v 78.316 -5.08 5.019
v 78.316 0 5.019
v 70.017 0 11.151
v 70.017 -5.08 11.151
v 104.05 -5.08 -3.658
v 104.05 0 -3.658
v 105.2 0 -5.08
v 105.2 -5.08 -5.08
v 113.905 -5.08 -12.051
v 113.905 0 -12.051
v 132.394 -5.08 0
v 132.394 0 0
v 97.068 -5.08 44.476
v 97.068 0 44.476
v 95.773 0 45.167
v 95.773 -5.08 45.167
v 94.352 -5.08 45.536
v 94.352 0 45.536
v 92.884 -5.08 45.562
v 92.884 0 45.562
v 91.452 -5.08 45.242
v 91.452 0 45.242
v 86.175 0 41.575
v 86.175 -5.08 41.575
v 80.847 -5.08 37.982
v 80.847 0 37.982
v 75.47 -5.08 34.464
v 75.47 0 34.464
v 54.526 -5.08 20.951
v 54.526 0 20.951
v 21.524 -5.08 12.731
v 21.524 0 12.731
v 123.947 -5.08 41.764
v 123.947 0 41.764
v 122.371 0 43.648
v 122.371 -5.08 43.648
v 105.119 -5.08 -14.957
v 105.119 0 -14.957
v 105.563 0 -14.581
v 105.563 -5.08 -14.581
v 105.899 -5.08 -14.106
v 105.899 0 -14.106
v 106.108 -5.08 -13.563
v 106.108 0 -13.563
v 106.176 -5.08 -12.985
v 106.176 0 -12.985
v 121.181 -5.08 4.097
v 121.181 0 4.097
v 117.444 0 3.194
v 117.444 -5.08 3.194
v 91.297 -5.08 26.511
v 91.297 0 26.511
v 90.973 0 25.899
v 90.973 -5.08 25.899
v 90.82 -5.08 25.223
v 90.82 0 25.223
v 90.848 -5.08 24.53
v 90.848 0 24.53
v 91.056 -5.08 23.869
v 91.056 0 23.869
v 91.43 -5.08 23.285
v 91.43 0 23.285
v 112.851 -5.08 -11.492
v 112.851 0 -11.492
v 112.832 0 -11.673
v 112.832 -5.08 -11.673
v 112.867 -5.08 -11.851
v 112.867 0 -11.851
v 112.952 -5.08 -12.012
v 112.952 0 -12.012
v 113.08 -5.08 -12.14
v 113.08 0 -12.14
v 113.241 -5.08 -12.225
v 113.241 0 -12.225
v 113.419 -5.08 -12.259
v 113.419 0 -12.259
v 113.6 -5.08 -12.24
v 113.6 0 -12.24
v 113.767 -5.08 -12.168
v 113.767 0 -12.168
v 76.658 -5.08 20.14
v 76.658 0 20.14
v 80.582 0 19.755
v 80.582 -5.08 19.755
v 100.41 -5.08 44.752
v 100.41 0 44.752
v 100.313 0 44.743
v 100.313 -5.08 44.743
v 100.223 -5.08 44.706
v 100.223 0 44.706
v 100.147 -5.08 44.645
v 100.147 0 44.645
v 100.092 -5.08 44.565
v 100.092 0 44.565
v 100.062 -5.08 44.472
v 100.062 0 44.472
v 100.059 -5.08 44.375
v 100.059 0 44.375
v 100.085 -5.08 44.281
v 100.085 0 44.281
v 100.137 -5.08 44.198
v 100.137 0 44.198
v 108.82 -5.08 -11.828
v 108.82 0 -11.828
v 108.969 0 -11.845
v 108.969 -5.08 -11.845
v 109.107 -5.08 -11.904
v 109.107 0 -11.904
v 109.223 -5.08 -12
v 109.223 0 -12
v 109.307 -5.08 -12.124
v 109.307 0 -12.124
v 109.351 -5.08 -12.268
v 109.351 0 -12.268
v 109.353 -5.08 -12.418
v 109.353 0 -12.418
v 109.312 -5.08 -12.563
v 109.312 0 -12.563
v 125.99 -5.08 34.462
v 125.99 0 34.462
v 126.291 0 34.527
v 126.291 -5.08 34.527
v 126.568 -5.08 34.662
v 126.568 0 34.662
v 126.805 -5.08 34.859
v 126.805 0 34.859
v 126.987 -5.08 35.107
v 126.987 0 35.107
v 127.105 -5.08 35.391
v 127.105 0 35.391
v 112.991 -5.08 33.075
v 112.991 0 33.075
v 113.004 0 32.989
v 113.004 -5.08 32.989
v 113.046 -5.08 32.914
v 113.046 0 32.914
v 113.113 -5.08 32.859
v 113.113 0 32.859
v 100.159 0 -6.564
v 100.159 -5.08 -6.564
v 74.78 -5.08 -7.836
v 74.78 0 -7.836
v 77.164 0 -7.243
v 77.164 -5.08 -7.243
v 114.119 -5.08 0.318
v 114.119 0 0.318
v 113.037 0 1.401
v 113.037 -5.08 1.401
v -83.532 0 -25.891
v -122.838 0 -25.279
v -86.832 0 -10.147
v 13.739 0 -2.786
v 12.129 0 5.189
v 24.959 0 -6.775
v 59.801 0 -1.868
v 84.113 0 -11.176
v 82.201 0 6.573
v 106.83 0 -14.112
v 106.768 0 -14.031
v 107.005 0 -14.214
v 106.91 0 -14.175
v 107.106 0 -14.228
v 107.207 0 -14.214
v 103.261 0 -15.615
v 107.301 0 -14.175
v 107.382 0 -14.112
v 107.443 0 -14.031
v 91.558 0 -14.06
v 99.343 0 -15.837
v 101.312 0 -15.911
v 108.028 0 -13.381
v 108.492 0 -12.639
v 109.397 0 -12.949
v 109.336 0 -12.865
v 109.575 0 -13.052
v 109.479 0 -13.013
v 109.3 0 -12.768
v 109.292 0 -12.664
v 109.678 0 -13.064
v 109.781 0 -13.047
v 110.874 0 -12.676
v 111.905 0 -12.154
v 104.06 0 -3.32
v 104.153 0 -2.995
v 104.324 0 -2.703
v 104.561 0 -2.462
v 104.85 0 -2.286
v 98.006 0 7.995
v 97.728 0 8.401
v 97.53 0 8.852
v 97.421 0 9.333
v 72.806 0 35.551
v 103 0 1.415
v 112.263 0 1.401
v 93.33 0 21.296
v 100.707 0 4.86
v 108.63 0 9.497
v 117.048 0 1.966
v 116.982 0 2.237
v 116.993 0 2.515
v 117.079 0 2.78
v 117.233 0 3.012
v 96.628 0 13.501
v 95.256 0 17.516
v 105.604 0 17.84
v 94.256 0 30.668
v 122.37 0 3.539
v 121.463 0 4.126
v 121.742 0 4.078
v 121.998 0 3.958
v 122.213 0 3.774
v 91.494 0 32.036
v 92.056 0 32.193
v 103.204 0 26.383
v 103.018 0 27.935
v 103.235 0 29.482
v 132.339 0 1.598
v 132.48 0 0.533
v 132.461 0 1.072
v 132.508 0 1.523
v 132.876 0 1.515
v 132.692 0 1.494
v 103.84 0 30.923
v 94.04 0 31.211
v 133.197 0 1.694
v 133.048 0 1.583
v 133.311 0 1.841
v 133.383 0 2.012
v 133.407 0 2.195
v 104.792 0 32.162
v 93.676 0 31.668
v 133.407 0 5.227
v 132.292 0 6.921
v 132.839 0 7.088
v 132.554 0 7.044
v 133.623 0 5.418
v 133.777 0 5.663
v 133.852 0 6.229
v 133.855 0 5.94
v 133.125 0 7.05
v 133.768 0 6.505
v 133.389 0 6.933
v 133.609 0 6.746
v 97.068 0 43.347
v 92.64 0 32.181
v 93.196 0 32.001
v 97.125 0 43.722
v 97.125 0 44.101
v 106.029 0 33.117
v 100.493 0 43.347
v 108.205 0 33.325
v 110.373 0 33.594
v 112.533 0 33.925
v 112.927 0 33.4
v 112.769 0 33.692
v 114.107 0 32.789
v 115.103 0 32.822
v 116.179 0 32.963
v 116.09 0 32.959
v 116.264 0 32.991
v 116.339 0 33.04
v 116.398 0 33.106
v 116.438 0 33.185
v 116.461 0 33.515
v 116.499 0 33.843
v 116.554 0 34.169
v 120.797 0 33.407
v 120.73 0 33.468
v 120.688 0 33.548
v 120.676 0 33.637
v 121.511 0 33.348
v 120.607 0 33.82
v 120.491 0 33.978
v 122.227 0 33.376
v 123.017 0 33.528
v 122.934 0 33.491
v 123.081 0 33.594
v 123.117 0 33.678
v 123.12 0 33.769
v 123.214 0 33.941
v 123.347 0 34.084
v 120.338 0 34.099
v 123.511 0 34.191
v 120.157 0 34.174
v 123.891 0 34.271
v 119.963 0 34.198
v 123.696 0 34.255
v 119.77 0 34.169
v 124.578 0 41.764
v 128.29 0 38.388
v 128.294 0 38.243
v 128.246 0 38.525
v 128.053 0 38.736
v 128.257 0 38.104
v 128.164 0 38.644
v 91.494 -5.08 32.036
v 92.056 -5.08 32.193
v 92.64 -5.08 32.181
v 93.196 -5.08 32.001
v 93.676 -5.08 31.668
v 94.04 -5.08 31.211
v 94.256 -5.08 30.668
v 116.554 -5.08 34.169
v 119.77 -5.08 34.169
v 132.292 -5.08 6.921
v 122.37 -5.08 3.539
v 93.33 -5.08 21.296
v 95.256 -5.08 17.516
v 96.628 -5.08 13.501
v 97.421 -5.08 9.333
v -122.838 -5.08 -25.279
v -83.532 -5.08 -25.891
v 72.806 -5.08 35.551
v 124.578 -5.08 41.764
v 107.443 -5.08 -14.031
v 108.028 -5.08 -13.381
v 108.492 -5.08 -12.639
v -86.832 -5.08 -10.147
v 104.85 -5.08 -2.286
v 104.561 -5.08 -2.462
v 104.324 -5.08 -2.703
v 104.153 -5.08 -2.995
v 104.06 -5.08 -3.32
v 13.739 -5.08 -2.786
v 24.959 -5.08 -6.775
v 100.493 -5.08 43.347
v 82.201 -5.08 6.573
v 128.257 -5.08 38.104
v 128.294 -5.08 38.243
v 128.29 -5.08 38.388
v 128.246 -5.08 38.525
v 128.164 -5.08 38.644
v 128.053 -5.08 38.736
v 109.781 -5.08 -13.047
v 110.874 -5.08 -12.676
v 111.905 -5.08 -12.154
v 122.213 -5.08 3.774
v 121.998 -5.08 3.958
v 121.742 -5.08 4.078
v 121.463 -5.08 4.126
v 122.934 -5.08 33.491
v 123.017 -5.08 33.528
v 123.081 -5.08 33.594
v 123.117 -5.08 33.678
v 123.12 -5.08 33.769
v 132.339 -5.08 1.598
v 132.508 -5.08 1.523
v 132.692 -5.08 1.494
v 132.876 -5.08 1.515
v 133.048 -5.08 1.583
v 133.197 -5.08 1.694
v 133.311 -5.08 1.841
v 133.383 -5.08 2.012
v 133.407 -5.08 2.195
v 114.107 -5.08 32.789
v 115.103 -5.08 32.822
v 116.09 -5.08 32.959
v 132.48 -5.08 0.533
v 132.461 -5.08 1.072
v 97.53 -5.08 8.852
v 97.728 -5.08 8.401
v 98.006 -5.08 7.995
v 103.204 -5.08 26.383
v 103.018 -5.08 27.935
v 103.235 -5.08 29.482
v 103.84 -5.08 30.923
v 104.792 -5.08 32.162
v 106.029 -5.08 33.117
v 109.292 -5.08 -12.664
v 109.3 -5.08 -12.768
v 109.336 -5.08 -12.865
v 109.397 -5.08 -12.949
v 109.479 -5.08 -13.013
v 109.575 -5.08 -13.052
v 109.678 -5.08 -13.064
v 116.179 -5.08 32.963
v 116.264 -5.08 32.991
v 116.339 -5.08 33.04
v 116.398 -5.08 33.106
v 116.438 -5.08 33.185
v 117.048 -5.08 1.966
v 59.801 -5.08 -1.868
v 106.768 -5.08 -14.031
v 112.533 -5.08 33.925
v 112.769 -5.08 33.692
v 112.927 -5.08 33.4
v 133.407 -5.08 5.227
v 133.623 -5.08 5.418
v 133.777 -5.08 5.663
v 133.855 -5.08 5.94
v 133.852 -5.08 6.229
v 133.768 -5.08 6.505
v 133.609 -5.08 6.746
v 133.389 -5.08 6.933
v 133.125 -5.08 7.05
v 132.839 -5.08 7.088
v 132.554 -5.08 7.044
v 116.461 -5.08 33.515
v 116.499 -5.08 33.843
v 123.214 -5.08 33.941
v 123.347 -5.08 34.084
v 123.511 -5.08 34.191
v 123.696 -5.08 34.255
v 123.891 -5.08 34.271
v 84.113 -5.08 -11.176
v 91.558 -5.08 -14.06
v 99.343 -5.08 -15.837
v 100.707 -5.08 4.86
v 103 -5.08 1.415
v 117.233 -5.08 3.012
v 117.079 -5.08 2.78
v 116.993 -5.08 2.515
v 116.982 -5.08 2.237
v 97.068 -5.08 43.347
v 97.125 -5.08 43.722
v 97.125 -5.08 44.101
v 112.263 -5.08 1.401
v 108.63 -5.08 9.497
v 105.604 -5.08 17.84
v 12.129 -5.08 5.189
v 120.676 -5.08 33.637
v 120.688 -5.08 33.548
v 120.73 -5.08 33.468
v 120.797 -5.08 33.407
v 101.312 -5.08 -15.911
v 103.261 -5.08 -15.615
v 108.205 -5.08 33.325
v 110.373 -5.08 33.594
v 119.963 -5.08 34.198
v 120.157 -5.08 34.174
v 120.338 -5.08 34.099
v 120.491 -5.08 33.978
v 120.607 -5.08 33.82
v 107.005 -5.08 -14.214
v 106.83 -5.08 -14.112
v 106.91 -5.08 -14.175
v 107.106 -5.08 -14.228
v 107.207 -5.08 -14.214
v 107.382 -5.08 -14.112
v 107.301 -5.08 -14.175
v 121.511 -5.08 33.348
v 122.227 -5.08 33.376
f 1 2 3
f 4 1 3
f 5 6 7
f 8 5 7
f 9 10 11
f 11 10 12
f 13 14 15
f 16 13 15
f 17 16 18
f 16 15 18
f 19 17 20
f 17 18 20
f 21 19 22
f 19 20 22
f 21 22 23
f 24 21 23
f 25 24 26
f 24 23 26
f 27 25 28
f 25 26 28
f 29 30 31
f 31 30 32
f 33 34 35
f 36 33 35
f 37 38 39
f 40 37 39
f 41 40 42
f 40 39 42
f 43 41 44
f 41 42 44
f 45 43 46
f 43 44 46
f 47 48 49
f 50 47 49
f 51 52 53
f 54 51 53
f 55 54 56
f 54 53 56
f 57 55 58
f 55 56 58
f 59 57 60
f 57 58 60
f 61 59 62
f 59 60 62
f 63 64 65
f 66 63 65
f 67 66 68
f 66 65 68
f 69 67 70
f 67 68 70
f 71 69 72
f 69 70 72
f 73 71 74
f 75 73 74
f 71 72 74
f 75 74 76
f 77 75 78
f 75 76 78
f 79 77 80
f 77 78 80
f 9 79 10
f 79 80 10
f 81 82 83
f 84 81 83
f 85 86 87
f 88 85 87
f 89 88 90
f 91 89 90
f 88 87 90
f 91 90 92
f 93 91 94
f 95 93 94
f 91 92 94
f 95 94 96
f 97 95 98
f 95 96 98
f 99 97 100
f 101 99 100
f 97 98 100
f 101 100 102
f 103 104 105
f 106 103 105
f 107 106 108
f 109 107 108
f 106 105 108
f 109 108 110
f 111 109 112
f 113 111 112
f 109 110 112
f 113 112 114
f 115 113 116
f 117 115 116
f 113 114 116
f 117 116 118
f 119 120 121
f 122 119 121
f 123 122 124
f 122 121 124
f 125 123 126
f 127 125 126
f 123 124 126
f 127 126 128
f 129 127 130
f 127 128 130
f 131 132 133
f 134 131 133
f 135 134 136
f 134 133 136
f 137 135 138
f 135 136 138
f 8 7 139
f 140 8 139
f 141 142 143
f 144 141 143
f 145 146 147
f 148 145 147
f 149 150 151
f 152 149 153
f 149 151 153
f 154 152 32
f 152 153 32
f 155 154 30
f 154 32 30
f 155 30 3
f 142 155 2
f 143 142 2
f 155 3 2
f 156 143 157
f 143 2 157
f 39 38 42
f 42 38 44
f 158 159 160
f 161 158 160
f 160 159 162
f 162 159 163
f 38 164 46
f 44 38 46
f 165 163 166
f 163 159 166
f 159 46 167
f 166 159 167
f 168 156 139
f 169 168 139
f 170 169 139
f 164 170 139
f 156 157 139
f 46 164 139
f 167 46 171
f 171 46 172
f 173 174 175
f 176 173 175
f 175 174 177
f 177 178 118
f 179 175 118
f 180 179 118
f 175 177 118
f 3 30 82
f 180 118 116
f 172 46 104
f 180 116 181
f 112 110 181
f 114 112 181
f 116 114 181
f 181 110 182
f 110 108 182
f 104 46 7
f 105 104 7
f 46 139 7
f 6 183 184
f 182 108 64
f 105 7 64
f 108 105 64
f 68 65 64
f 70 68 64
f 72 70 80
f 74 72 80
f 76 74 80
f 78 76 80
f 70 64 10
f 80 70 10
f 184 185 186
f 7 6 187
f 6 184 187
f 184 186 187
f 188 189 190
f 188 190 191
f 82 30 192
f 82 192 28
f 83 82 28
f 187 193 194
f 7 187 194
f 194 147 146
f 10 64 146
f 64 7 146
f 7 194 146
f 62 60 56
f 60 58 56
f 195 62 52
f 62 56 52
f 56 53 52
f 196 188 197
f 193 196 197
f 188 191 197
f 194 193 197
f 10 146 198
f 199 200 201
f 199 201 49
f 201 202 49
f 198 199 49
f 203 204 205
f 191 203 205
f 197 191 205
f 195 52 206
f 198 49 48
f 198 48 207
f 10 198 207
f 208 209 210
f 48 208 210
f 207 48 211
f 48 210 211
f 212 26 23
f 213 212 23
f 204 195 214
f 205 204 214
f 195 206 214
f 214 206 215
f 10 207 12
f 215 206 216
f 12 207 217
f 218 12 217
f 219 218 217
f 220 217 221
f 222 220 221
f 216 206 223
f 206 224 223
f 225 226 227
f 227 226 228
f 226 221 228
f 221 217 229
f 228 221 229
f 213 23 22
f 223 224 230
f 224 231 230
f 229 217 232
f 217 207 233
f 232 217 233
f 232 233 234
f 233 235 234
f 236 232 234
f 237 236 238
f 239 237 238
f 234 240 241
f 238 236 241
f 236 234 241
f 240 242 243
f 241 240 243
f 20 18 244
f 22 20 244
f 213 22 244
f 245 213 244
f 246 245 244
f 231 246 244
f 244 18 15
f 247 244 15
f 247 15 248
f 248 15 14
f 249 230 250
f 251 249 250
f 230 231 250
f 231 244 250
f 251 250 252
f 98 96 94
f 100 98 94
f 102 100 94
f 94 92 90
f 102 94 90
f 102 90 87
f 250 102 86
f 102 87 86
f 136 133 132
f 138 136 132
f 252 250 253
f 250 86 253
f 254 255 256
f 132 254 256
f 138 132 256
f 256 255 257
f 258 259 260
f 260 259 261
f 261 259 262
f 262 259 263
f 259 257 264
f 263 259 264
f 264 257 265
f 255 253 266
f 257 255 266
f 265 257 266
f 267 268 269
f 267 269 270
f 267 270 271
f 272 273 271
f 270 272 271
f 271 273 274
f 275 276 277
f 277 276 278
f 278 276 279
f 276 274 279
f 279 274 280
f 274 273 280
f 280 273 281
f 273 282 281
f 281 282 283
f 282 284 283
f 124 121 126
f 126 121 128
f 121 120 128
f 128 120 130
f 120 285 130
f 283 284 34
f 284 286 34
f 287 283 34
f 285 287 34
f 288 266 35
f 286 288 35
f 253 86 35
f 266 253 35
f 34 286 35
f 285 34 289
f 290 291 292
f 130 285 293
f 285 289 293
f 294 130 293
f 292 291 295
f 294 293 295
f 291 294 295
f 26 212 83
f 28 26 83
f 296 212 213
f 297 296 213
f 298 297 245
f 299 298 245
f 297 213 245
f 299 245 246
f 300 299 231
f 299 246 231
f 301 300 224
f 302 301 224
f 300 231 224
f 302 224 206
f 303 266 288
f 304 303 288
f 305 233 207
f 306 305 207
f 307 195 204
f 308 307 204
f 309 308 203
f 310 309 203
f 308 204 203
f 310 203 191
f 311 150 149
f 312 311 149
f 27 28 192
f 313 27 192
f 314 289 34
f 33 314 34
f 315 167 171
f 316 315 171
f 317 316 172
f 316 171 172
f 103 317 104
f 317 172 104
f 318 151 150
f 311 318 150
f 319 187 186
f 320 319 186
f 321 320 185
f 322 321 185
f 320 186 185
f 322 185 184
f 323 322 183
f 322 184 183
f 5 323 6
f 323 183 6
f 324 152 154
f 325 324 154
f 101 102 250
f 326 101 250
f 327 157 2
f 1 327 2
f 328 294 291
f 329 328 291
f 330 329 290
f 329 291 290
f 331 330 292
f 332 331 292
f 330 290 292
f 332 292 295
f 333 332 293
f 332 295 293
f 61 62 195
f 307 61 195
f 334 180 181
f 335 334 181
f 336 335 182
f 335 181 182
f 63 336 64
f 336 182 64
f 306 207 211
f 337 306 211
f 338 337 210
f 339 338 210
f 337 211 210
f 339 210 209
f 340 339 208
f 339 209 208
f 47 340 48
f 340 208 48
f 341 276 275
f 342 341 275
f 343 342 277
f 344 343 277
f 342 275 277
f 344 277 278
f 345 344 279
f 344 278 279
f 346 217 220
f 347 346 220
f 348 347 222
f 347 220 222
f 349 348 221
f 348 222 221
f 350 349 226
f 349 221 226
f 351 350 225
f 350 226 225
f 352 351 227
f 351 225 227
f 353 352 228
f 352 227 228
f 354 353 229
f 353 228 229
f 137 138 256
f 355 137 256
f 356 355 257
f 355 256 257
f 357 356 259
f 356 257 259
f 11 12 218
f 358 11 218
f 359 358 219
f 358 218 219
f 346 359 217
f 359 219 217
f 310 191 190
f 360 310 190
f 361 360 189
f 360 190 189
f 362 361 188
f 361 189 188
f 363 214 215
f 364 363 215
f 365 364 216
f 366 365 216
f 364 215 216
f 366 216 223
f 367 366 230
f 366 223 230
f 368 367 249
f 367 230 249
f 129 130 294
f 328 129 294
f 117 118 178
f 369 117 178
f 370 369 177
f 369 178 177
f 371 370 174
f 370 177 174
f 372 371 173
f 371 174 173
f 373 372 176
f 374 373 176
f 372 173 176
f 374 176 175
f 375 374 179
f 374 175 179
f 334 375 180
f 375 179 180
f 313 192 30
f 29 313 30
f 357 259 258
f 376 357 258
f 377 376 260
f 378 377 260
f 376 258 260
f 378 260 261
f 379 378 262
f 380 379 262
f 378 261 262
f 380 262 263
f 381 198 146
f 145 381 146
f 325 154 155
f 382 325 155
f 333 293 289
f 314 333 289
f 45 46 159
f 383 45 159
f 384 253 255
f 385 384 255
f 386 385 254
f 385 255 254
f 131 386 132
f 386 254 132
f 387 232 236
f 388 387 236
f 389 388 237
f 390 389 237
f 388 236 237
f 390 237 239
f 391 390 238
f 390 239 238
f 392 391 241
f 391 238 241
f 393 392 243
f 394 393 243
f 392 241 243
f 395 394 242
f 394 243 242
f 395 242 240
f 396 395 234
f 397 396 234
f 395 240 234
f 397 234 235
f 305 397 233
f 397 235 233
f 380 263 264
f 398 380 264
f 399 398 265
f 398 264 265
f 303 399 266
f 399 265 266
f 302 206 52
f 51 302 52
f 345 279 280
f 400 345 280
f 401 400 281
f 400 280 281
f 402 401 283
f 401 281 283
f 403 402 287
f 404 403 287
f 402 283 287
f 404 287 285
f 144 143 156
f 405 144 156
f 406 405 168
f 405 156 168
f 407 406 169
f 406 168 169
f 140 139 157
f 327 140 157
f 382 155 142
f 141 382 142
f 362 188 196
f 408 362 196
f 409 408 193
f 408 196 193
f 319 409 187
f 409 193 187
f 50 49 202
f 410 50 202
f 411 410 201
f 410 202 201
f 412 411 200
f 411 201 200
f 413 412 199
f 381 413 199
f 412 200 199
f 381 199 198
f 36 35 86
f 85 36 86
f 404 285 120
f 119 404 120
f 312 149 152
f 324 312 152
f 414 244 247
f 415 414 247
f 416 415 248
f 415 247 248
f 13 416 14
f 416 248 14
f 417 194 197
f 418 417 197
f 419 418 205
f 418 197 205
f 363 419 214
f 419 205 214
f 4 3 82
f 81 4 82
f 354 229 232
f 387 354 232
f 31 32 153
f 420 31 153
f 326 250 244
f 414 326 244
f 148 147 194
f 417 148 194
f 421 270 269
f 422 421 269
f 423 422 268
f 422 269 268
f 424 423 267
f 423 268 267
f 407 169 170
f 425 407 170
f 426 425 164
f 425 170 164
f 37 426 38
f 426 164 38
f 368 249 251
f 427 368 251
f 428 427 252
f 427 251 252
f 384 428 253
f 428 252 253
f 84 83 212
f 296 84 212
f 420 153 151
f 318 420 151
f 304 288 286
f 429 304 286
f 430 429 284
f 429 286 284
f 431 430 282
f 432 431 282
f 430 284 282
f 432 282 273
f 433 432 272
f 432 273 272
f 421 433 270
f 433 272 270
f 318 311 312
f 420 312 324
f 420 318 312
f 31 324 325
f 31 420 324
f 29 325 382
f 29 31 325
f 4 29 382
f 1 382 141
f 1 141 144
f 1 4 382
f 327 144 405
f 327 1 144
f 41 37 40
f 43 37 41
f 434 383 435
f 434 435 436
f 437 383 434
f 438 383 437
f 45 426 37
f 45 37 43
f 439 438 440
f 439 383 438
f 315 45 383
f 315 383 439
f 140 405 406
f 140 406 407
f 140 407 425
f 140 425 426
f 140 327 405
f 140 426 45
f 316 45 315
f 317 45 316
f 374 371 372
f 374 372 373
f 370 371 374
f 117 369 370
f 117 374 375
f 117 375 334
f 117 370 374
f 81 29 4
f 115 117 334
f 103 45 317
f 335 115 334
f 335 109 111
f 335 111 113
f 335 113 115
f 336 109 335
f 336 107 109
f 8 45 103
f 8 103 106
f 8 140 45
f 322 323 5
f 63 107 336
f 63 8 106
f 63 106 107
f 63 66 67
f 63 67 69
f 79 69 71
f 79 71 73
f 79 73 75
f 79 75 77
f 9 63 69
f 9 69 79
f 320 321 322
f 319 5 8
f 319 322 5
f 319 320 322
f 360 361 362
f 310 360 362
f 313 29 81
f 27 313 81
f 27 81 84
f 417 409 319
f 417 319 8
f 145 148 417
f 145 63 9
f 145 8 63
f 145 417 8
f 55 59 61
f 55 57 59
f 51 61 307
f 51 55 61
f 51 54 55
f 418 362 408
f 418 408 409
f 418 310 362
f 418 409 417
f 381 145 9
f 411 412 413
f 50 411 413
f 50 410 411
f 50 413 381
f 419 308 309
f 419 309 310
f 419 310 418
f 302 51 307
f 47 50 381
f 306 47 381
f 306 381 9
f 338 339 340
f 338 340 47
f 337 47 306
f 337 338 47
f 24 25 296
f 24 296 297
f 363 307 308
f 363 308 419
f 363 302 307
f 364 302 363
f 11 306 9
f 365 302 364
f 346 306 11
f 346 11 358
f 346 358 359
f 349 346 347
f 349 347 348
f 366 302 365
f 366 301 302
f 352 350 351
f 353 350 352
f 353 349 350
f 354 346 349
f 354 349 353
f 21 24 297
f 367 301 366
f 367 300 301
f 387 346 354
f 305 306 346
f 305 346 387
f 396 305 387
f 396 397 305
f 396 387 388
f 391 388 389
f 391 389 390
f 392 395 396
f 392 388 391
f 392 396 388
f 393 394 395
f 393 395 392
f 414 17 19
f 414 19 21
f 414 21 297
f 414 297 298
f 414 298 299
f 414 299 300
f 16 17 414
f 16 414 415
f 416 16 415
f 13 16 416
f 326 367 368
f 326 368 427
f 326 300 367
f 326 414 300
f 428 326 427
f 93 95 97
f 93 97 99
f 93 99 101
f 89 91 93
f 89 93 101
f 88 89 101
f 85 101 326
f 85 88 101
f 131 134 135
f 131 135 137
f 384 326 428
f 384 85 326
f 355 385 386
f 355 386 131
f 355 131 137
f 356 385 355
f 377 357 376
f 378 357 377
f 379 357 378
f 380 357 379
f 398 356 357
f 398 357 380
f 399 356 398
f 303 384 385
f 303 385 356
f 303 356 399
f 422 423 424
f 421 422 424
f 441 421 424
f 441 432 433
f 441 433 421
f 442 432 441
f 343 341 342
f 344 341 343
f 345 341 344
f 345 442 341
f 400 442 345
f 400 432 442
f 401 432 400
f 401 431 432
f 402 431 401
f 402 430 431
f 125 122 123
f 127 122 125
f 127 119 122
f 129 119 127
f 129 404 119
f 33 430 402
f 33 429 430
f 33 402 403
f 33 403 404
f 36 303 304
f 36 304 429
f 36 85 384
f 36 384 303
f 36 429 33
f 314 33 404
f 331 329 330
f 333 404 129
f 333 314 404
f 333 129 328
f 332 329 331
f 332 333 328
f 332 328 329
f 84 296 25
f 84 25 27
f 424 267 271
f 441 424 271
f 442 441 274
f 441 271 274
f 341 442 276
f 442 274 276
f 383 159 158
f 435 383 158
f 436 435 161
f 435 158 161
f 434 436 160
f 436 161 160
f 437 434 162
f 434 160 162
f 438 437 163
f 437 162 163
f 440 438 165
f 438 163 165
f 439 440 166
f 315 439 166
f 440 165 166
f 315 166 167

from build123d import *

# Parameters (mm, degrees)
F1_DEPTH = 5.08


# Not quite as in the source:
# - ends of sketch curves that miss each other by under 0.0002 mm in the source are joined


with BuildPart() as f1:
    # F0 (on Front) → F1 (new body)
    with BuildSketch(Plane.XZ):
        with BuildLine():
            Line((122.3705169674, 43.6478478759), (100.4099901217, 44.7520101639))
            ThreePointArc((100.4099901217, 44.7520101639), (100.0915452408, 44.5649170993), (100.1369538552, 44.1983805872))
            Line((100.1369538552, 44.1983805872), (100.4933528952, 43.3469744222))
            Line((100.4933528952, 43.3469744222), (97.0679359779, 43.3469744222))
            ThreePointArc((97.0679359779, 43.3469744222), (97.1316973251, 43.9112769391), (97.0679359779, 44.4755794561))
            ThreePointArc((97.0679359779, 44.4755794561), (94.352164437, 45.5363400819), (91.4515092493, 45.2416747635))
            ThreePointArc((91.4515092493, 45.2416747635), (83.5169492087, 39.7690696601), (75.469607442, 34.4637006676))
            Line((75.469607442, 34.4637006676), (72.8059848223, 35.5506727573))
            Line((72.8059848223, 35.5506727573), (54.5259908631, 20.9512186051))
            Line((54.5259908631, 20.9512186051), (21.5238705481, 12.7313591723))
            Line((21.5238705481, 12.7313591723), (12.1287463537, 5.188944246))
            Line((12.1287463537, 5.188944246), (-86.8316226794, -10.1466157916))
            Line((-86.8316226794, -10.1466157916), (-122.8382140398, -25.2789985389))
            Line((-122.8382140398, -25.2789985389), (-83.5318863392, -25.8913505822))
            Line((-83.5318863392, -25.8913505822), (13.7389805729, -2.7855467746))
            Line((13.7389805729, -2.7855467746), (24.9590244256, -6.7754736037))
            Line((24.9590244256, -6.7754736037), (59.8014198344, -1.8680947637))
            Line((59.8014198344, -1.8680947637), (74.7804443647, -7.8362995921))
            Line((74.7804443647, -7.8362995921), (77.1637969914, -7.2426764133))
            ThreePointArc((77.1637969914, -7.2426764133), (87.7830978003, -12.7533844887), (99.34301444, -15.8365290594))
            ThreePointArc((99.34301444, -15.8365290594), (102.2935896026, -15.8090472805), (105.1187411592, -14.9574794792))
            ThreePointArc((105.1187411592, -14.9574794792), (105.899310207, -14.1060464291), (106.1757861101, -12.9845357079))
            Line((106.1757861101, -12.9845357079), (106.7682035421, -14.0309760573))
            ThreePointArc((106.7682035421, -14.0309760573), (107.1058211072, -14.2278082292), (107.4434386724, -14.0309760573))
            ThreePointArc((107.4434386724, -14.0309760573), (108.2763784739, -13.0200234045), (108.8199970928, -11.8282630359))
            ThreePointArc((108.8199970928, -11.8282630359), (109.2695277638, -12.0590826755), (109.3121668662, -12.562607687))
            ThreePointArc((109.3121668662, -12.562607687), (109.3974608172, -12.9490474891), (109.7808973473, -13.0469617679))
            ThreePointArc((109.7808973473, -13.0469617679), (111.3986393651, -12.4328774082), (112.8510778468, -11.4923396397))
            ThreePointArc((112.8510778468, -11.4923396397), (113.1573925131, -12.1883188801), (113.9052785257, -12.0509060352))
            Line((113.9052785257, -12.0509060352), (132.3935237104, 0))
            ThreePointArc((132.3935237104, 0), (132.4837449873, 0.8029846441), (132.338838949, 1.5979226652))
            ThreePointArc((132.338838949, 1.5979226652), (133.0482342221, 1.5833492596), (133.4072056247, 2.1953897564))
            Line((133.4072056247, 2.1953897564), (133.4072056247, 5.2268817127))
            ThreePointArc((133.4072056247, 5.2268817127), (133.6969073142, 6.6313363292), (132.2924526977, 6.9210380187))
            Line((132.2924526977, 6.9210380187), (122.3704141488, 3.5393718949))
            ThreePointArc((122.3704141488, 3.5393718949), (121.873706248, 4.0268683816), (121.1812593401, 4.096788644))
            Line((121.1812593401, 4.096788644), (117.4436091822, 3.1937307858))
            ThreePointArc((117.4436091822, 3.1937307858), (117.0266780243, 2.6505498353), (117.0476117867, 1.966123862))
            Line((117.0476117867, 1.966123862), (114.1193957515, 0.3182646199))
            Line((114.1193957515, 0.3182646199), (113.0366831493, 1.4009768977))
            Line((113.0366831493, 1.4009768977), (112.2633179935, 1.4009768977))
            ThreePointArc((112.2633179935, 1.4009768977), (107.0399689979, 13.6404694995), (103.2035150013, 26.3829250952))
            ThreePointArc((103.2035150013, 26.3829250952), (103.4910499167, 30.2221985041), (106.029088113, 33.1172043332))
            ThreePointArc((106.029088113, 33.1172043332), (109.2898552798, 33.4516431179), (112.5333359919, 33.9252301607))
            ThreePointArc((112.5333359919, 33.9252301607), (112.8589818565, 33.5520971563), (112.9913329797, 33.074858591))
            ThreePointArc((112.9913329797, 33.074858591), (113.0214742771, 32.9498651341), (113.1128615921, 32.8594205615))
            ThreePointArc((113.1128615921, 32.8594205615), (114.605495502, 32.7922614875), (116.0903229782, 32.9588558937))
            ThreePointArc((116.0903229782, 32.9588558937), (116.3029445973, 33.0127632591), (116.4383345302, 33.1853422934))
            ThreePointArc((116.4383345302, 33.1853422934), (116.4779468759, 33.679151188), (116.554347608, 34.1686195634))
            Line((116.554347608, 34.1686195634), (119.7698420306, 34.1686195634))
            ThreePointArc((119.7698420306, 34.1686195634), (120.3377346413, 34.0985961328), (120.6763827811, 33.6373773826))
            ThreePointArc((120.6763827811, 33.6373773826), (120.705556032, 33.5058788759), (120.7971017103, 33.4070743991))
            ThreePointArc((120.7971017103, 33.4070743991), (121.8693321552, 33.350668944), (122.933876584, 33.4906863059))
            ThreePointArc((122.933876584, 33.4906863059), (123.0810934781, 33.5938295086), (123.11967467, 33.7693938154))
            ThreePointArc((123.11967467, 33.7693938154), (123.4255269006, 34.1427273195), (123.8907699445, 34.2710721767))
            Line((123.8907699445, 34.2710721767), (125.9903685922, 34.462153965))
            ThreePointArc((125.9903685922, 34.462153965), (126.6924885264, 34.7530229594), (127.1051986302, 35.3911824568))
            Line((127.1051986302, 35.3911824568), (128.2572048943, 38.1039466219))
            ThreePointArc((128.2572048943, 38.1039466219), (128.2729126944, 38.4579608874), (128.0528186952, 38.7356864116))
            Line((128.0528186952, 38.7356864116), (124.5782394715, 41.7643239316))
            Line((124.5782394715, 41.7643239316), (123.9465066021, 41.7643239316))
            Line((123.9465066021, 41.7643239316), (122.3705169674, 43.6478478759))
        make_face()
        with BuildLine():
            Line((70.0165052271, 11.150856785), (76.6579802489, 20.1397516237))
            Line((76.6579802489, 20.1397516237), (80.5816721076, 19.7545750625))
            Line((80.5816721076, 19.7545750625), (91.4935366546, 32.0359588494))
            ThreePointArc((91.4935366546, 32.0359588494), (93.1959095158, 32.0009597447), (94.2558714279, 30.6683761485))
            Line((94.2558714279, 30.6683761485), (91.2971296419, 26.5111941478))
            ThreePointArc((91.2971296419, 26.5111941478), (90.8112616397, 24.8754815968), (91.4297100848, 23.2851530817))
            Line((91.4297100848, 23.2851530817), (93.3299813237, 21.2964983411))
            ThreePointArc((93.3299813237, 21.2964983411), (96.0132194113, 15.5328655264), (97.4206326201, 9.3329931151))
            ThreePointArc((97.4206326201, 9.3329931151), (97.6181949936, 8.6221123526), (98.0063865531, 7.9946654121))
            ThreePointArc((98.0063865531, 7.9946654121), (101.9070751405, 3.1730744617), (104.8498501941, -2.2861549466))
            ThreePointArc((104.8498501941, -2.2861549466), (104.2291914062, -2.8435135125), (104.0495855612, -3.6581346774))
            Line((104.0495855612, -3.6581346774), (105.1997786885, -5.0801357056))
            Line((105.1997786885, -5.0801357056), (100.1594934993, -6.5642189378))
            Line((100.1594934993, -6.5642189378), (82.2009610937, 6.5729623924))
            Line((82.2009610937, 6.5729623924), (78.3157963351, 5.0188977865))
            Line((78.3157963351, 5.0188977865), (70.0165052271, 11.150856785))
        make_face(mode=Mode.SUBTRACT)
    extrude(amount=F1_DEPTH)


solid = f1.part
